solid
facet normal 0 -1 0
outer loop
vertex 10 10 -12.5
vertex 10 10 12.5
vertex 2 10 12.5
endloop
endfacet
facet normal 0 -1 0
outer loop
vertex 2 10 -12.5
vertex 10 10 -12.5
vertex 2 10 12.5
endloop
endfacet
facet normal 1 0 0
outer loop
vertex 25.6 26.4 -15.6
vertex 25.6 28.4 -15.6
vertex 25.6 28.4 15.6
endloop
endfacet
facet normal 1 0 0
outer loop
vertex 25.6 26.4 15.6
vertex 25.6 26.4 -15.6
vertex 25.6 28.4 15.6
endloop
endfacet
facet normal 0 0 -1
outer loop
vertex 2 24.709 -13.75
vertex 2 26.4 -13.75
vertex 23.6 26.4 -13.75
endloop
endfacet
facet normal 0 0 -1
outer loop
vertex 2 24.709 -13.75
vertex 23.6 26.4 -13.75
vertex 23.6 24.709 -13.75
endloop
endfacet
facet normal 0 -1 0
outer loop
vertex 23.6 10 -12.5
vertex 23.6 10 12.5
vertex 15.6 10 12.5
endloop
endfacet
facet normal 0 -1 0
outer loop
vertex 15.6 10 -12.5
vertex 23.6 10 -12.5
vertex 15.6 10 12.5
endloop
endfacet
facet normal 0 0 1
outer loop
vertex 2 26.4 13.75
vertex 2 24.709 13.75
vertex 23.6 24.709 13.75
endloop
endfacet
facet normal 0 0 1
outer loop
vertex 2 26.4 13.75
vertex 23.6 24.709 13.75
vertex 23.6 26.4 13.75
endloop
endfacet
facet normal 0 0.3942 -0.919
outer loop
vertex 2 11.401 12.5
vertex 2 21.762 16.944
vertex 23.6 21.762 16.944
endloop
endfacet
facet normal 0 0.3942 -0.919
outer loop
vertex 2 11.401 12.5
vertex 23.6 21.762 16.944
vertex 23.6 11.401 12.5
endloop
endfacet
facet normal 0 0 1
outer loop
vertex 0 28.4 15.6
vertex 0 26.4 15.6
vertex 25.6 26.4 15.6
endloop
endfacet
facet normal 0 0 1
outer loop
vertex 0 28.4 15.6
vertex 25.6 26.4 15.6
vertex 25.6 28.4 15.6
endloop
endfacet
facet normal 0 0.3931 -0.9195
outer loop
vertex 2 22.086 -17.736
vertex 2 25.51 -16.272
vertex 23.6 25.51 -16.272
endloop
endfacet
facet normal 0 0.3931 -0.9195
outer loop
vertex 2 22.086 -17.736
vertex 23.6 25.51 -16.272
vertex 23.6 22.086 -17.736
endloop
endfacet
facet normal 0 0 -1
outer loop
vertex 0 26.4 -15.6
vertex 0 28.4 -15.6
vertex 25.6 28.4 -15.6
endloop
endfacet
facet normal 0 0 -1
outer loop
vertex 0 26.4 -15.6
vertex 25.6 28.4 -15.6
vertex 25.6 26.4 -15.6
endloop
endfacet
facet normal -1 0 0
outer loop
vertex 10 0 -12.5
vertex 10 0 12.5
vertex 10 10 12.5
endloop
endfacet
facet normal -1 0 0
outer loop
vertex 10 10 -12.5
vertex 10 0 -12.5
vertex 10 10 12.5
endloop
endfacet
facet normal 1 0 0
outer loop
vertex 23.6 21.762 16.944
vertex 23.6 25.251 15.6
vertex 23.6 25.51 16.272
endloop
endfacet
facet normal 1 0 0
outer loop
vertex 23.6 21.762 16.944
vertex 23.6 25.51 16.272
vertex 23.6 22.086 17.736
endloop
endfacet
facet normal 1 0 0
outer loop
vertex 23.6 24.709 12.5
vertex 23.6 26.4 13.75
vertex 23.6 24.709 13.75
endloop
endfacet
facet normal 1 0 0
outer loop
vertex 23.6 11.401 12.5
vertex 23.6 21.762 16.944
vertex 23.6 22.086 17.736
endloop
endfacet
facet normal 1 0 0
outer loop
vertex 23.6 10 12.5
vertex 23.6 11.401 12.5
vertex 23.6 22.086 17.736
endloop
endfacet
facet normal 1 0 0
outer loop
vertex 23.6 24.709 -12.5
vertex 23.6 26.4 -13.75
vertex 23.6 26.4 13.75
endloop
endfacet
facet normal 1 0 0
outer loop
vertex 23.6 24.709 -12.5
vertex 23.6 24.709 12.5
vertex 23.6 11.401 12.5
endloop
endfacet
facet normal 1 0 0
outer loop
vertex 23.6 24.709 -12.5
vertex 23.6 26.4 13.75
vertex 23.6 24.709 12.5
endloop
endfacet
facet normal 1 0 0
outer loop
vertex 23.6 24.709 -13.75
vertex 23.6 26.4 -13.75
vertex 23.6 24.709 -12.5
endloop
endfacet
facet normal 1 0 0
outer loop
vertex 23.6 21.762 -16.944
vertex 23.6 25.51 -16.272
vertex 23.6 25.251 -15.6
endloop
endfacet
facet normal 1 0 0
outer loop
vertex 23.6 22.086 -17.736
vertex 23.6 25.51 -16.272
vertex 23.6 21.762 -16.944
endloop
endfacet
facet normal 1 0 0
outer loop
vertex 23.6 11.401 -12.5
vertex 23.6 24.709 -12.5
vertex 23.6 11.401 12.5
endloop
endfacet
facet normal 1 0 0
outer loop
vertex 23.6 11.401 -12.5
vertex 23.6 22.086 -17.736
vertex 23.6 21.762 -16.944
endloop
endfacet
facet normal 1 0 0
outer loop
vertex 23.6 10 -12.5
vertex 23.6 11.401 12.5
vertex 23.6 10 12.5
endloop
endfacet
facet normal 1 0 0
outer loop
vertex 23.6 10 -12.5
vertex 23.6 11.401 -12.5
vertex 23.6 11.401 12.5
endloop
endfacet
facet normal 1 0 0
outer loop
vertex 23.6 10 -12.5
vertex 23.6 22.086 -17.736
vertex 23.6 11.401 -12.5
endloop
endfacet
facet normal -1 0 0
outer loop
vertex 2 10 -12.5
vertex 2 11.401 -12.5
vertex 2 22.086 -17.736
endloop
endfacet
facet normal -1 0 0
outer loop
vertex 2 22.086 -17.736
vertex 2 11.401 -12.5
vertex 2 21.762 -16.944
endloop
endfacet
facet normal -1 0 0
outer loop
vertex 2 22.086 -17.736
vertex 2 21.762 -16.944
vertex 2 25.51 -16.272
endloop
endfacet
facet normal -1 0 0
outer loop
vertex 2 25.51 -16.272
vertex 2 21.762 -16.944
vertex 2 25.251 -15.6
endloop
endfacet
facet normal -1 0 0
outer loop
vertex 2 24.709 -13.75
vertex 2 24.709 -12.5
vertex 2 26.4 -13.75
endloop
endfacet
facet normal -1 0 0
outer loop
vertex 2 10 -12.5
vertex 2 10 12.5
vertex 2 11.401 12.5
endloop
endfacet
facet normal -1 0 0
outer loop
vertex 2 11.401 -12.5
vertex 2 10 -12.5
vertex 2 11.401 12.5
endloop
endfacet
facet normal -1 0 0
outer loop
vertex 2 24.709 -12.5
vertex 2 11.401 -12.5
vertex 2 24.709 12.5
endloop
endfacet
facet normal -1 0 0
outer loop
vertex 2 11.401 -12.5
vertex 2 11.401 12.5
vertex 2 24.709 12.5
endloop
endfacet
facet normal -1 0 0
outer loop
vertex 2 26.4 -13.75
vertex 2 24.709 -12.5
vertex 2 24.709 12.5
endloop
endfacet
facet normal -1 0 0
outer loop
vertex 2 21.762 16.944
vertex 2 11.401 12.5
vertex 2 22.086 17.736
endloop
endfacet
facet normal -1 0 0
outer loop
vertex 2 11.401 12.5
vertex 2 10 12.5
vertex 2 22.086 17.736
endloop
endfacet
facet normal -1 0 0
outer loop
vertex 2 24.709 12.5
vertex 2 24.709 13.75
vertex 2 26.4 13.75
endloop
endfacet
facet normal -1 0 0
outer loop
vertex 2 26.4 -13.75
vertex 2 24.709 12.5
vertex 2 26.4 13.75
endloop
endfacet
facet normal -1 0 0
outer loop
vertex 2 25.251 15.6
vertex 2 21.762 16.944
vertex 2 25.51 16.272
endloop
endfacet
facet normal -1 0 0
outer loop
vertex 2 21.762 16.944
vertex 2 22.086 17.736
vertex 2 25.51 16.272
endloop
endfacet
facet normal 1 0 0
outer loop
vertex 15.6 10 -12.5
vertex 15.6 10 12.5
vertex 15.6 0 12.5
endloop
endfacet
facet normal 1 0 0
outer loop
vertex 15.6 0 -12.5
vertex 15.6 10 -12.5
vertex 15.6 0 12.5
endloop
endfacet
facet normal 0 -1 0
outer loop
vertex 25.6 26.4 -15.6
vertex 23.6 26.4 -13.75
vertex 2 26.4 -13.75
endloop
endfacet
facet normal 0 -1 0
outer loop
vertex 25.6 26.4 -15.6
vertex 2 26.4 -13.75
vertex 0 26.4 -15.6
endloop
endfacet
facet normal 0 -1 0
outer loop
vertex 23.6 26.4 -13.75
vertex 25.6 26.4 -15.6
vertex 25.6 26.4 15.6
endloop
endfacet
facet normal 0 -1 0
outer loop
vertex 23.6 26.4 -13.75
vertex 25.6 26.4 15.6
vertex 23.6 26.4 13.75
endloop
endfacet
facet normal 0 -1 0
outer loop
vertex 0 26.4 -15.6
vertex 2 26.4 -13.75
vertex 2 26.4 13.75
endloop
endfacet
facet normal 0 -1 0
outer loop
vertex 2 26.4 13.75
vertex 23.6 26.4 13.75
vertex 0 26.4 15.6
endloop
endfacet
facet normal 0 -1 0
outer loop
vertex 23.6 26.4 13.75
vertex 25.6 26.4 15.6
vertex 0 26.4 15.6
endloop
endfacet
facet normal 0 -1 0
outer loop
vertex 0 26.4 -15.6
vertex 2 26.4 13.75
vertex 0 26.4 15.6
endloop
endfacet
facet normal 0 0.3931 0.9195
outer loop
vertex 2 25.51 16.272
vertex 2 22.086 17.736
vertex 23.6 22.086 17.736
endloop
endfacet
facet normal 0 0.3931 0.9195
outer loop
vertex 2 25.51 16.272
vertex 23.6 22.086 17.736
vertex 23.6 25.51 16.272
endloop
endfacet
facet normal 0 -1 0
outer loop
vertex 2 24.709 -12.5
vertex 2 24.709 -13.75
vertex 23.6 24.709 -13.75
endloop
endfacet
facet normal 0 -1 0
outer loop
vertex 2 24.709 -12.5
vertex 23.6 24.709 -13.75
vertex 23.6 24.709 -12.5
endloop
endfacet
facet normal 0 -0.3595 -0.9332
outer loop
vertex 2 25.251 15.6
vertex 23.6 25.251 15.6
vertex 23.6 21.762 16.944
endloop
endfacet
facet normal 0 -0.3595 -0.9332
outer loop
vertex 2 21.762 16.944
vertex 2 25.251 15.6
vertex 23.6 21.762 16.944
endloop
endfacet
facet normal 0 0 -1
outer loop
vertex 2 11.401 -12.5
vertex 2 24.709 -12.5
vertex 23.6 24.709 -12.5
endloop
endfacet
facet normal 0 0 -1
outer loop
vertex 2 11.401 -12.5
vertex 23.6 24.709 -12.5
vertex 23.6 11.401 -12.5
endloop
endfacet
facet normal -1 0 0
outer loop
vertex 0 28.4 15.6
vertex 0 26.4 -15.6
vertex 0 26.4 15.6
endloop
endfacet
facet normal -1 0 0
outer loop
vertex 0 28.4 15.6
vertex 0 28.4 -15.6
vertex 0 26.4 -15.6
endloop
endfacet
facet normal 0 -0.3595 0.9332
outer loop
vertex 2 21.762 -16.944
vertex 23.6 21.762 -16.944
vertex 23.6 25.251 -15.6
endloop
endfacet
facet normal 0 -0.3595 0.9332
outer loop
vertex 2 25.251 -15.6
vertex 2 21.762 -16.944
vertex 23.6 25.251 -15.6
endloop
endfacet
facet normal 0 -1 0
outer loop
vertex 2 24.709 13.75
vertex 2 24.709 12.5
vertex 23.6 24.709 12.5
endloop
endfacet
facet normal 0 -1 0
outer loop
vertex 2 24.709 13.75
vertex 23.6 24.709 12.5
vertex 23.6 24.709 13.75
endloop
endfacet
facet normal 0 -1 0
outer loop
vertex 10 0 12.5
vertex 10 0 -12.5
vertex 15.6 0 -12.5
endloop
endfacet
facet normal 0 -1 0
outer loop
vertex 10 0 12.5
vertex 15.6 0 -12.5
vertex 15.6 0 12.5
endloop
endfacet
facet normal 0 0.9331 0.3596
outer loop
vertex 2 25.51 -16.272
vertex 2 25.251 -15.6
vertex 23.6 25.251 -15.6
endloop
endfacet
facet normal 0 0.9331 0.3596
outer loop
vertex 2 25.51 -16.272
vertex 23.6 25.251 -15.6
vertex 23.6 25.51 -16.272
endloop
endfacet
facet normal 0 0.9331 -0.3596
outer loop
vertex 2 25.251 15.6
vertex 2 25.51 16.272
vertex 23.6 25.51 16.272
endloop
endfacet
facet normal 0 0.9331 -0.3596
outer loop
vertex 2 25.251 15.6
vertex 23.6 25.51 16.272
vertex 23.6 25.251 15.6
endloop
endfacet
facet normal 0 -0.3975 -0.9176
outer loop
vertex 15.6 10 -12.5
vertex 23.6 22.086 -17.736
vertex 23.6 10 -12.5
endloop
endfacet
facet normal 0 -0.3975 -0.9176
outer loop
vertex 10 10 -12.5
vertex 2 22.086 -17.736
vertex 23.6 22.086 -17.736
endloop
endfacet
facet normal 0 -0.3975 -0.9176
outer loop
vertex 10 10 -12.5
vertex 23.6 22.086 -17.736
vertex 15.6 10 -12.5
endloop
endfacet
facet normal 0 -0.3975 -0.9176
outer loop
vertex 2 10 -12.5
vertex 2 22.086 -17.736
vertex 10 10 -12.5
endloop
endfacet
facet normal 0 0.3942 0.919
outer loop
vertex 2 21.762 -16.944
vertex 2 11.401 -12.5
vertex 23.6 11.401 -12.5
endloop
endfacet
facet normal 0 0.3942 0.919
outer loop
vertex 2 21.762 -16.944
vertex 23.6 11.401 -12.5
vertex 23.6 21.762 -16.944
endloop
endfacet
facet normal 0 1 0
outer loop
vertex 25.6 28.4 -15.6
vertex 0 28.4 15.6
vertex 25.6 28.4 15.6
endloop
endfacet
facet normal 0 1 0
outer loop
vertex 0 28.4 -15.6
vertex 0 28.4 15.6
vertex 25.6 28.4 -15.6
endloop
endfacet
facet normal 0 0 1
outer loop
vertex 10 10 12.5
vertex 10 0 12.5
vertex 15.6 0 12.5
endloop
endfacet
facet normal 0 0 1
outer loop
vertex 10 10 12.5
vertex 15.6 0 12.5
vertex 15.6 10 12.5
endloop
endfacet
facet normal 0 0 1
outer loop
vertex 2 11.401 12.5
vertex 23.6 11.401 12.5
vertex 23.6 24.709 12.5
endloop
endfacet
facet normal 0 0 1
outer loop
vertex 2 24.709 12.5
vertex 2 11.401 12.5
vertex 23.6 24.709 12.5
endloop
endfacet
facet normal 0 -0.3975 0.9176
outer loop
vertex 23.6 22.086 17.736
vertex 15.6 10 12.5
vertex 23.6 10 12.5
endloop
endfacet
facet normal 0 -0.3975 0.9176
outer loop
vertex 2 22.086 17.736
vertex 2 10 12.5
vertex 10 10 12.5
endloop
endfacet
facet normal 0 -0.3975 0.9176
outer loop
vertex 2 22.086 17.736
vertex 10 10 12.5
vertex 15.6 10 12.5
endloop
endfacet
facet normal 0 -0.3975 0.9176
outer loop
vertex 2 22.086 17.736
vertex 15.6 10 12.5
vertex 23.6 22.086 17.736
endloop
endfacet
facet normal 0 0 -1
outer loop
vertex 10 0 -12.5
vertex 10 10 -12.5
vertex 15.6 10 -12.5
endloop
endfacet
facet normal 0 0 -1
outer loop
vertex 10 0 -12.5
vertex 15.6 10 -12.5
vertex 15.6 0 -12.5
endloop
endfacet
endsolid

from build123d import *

# Parameters (mm, degrees)
EXTRUDE_1_DEPTH          = 25.6
SKETCH_2_OUTSIDE_W       = 38.032
SKETCH_2_OUTSIDE_H       = 40.832
CUT_EXTRUDE_1_DEPTH      = 6.235907328
CUT_EXTRUDE_1_DEPTH_BACK = 31.235907328


with BuildPart() as part:
    # Эскиз1 → Бобышка-Вытянуть1 (new body)
    with BuildSketch(Plane(origin=(0, 0, 0), x_dir=(0, 0, -1), z_dir=(1, 0, 0))):
        Polygon((12.5, 0), (-12.5, 0), (-12.5, 10), (-17.735907328, 22.085646779), (-16.27222348, 25.510475942), (-15.6, 25.25148825), (-16.94444696, 21.761867538), (-12.5, 11.400931817), (-12.5, 24.709221845), (-13.75, 24.709221845), (-13.75, 26.4), (-15.6, 26.4), (-15.6, 28.4), (15.6, 28.4), (15.6, 26.4), (13.75, 26.4), (13.75, 24.709221845), (12.5, 24.709221845), (12.5, 11.400931817), (16.94444696, 21.761867538), (15.6, 25.25148825), (16.27222348, 25.510475942), (17.735907328, 22.085646779), (12.5, 10), align=None)
    extrude(amount=EXTRUDE_1_DEPTH)

    # Эскиз2 outside → Вырез-Вытянуть1 (cut, two sides)
    with BuildSketch(Plane.XY.offset(12.5)) as cut_extrude_1_sk:
        with Locations((12.8, 14.2)):
            Rectangle(SKETCH_2_OUTSIDE_W, SKETCH_2_OUTSIDE_H)
        Polygon((2, 10), (2, 26.4), (0, 26.4), (0, 28.4), (25.6, 28.4), (25.6, 26.4), (23.6, 26.4), (23.6, 10), (15.6, 10), (15.6, 0), (10, 0), (10, 10), align=None, mode=Mode.SUBTRACT)
    extrude(amount=CUT_EXTRUDE_1_DEPTH, mode=Mode.SUBTRACT)
    extrude(cut_extrude_1_sk.sketch, amount=-CUT_EXTRUDE_1_DEPTH_BACK, mode=Mode.SUBTRACT)


solid = part.part
